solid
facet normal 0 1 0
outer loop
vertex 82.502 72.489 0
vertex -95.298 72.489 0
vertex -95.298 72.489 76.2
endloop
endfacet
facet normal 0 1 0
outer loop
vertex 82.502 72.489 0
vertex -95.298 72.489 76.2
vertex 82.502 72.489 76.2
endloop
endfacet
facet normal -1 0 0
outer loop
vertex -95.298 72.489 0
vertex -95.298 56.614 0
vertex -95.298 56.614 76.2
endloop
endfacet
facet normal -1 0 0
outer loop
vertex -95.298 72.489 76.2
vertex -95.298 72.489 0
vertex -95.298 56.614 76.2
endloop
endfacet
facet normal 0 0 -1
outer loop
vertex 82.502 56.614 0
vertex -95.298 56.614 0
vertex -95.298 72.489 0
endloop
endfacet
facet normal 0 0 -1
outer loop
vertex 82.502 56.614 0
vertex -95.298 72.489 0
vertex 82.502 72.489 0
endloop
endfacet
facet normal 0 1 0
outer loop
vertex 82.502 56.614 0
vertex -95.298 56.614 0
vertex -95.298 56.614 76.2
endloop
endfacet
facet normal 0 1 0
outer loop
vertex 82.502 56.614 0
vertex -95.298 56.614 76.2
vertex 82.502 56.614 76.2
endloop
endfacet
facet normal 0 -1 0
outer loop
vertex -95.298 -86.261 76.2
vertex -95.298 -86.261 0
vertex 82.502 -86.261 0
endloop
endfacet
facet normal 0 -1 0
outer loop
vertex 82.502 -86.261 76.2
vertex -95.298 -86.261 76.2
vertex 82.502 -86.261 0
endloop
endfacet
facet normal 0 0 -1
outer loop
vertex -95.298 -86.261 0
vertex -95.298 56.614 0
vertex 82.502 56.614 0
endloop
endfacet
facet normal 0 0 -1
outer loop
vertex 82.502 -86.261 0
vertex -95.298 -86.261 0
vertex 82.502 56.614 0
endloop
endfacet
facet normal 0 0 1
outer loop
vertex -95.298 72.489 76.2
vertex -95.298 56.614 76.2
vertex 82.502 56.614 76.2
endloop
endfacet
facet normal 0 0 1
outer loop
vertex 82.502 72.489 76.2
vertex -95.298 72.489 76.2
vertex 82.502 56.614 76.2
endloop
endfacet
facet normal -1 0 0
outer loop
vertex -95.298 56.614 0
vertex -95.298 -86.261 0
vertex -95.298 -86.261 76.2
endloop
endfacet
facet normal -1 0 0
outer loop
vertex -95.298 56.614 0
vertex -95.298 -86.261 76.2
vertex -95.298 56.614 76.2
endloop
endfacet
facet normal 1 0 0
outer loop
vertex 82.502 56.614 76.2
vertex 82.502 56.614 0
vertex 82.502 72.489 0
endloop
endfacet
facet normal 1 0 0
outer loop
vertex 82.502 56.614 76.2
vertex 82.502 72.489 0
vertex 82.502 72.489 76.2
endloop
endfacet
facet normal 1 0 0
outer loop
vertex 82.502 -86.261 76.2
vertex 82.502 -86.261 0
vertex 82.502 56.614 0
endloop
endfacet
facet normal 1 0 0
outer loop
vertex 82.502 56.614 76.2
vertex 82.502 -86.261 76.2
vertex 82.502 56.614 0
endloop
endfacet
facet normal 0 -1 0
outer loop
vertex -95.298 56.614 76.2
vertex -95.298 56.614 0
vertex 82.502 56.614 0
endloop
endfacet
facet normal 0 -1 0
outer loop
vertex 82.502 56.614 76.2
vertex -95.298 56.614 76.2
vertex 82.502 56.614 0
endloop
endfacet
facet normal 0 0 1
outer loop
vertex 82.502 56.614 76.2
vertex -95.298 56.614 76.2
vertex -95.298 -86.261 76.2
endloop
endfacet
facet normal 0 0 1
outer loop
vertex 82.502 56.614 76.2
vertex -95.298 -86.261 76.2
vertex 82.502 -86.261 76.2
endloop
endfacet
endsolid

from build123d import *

# Parameters (mm, degrees)
F0_W     = 177.8
F0_H     = 142.875
F1_DEPTH = 76.2
F2_DEPTH = 15.875


# Not quite as in the source:
# - a length typed as a fraction of an inch, garbled in the dataset ("3 / 203.2 mm" for 3/8 in), is restored


with BuildPart() as f1:
    # F0 (on Top) → F1 (new body)
    with BuildSketch(Plane.XY):
        with Locations((-6.3983104533, -14.8231089294)):
            Rectangle(F0_W, F0_H)
    extrude(amount=F1_DEPTH)


with BuildPart() as f2:
    # F2 (new): a face of the model
    f2_faces = [f1.part.faces().sort_by_distance(p)[0] for p in [
        (-6.3983104533, 56.6143910706, 38.1),
    ]]
    extrude(f2_faces, amount=F2_DEPTH)


solid = Compound([f1.part, f2.part])
